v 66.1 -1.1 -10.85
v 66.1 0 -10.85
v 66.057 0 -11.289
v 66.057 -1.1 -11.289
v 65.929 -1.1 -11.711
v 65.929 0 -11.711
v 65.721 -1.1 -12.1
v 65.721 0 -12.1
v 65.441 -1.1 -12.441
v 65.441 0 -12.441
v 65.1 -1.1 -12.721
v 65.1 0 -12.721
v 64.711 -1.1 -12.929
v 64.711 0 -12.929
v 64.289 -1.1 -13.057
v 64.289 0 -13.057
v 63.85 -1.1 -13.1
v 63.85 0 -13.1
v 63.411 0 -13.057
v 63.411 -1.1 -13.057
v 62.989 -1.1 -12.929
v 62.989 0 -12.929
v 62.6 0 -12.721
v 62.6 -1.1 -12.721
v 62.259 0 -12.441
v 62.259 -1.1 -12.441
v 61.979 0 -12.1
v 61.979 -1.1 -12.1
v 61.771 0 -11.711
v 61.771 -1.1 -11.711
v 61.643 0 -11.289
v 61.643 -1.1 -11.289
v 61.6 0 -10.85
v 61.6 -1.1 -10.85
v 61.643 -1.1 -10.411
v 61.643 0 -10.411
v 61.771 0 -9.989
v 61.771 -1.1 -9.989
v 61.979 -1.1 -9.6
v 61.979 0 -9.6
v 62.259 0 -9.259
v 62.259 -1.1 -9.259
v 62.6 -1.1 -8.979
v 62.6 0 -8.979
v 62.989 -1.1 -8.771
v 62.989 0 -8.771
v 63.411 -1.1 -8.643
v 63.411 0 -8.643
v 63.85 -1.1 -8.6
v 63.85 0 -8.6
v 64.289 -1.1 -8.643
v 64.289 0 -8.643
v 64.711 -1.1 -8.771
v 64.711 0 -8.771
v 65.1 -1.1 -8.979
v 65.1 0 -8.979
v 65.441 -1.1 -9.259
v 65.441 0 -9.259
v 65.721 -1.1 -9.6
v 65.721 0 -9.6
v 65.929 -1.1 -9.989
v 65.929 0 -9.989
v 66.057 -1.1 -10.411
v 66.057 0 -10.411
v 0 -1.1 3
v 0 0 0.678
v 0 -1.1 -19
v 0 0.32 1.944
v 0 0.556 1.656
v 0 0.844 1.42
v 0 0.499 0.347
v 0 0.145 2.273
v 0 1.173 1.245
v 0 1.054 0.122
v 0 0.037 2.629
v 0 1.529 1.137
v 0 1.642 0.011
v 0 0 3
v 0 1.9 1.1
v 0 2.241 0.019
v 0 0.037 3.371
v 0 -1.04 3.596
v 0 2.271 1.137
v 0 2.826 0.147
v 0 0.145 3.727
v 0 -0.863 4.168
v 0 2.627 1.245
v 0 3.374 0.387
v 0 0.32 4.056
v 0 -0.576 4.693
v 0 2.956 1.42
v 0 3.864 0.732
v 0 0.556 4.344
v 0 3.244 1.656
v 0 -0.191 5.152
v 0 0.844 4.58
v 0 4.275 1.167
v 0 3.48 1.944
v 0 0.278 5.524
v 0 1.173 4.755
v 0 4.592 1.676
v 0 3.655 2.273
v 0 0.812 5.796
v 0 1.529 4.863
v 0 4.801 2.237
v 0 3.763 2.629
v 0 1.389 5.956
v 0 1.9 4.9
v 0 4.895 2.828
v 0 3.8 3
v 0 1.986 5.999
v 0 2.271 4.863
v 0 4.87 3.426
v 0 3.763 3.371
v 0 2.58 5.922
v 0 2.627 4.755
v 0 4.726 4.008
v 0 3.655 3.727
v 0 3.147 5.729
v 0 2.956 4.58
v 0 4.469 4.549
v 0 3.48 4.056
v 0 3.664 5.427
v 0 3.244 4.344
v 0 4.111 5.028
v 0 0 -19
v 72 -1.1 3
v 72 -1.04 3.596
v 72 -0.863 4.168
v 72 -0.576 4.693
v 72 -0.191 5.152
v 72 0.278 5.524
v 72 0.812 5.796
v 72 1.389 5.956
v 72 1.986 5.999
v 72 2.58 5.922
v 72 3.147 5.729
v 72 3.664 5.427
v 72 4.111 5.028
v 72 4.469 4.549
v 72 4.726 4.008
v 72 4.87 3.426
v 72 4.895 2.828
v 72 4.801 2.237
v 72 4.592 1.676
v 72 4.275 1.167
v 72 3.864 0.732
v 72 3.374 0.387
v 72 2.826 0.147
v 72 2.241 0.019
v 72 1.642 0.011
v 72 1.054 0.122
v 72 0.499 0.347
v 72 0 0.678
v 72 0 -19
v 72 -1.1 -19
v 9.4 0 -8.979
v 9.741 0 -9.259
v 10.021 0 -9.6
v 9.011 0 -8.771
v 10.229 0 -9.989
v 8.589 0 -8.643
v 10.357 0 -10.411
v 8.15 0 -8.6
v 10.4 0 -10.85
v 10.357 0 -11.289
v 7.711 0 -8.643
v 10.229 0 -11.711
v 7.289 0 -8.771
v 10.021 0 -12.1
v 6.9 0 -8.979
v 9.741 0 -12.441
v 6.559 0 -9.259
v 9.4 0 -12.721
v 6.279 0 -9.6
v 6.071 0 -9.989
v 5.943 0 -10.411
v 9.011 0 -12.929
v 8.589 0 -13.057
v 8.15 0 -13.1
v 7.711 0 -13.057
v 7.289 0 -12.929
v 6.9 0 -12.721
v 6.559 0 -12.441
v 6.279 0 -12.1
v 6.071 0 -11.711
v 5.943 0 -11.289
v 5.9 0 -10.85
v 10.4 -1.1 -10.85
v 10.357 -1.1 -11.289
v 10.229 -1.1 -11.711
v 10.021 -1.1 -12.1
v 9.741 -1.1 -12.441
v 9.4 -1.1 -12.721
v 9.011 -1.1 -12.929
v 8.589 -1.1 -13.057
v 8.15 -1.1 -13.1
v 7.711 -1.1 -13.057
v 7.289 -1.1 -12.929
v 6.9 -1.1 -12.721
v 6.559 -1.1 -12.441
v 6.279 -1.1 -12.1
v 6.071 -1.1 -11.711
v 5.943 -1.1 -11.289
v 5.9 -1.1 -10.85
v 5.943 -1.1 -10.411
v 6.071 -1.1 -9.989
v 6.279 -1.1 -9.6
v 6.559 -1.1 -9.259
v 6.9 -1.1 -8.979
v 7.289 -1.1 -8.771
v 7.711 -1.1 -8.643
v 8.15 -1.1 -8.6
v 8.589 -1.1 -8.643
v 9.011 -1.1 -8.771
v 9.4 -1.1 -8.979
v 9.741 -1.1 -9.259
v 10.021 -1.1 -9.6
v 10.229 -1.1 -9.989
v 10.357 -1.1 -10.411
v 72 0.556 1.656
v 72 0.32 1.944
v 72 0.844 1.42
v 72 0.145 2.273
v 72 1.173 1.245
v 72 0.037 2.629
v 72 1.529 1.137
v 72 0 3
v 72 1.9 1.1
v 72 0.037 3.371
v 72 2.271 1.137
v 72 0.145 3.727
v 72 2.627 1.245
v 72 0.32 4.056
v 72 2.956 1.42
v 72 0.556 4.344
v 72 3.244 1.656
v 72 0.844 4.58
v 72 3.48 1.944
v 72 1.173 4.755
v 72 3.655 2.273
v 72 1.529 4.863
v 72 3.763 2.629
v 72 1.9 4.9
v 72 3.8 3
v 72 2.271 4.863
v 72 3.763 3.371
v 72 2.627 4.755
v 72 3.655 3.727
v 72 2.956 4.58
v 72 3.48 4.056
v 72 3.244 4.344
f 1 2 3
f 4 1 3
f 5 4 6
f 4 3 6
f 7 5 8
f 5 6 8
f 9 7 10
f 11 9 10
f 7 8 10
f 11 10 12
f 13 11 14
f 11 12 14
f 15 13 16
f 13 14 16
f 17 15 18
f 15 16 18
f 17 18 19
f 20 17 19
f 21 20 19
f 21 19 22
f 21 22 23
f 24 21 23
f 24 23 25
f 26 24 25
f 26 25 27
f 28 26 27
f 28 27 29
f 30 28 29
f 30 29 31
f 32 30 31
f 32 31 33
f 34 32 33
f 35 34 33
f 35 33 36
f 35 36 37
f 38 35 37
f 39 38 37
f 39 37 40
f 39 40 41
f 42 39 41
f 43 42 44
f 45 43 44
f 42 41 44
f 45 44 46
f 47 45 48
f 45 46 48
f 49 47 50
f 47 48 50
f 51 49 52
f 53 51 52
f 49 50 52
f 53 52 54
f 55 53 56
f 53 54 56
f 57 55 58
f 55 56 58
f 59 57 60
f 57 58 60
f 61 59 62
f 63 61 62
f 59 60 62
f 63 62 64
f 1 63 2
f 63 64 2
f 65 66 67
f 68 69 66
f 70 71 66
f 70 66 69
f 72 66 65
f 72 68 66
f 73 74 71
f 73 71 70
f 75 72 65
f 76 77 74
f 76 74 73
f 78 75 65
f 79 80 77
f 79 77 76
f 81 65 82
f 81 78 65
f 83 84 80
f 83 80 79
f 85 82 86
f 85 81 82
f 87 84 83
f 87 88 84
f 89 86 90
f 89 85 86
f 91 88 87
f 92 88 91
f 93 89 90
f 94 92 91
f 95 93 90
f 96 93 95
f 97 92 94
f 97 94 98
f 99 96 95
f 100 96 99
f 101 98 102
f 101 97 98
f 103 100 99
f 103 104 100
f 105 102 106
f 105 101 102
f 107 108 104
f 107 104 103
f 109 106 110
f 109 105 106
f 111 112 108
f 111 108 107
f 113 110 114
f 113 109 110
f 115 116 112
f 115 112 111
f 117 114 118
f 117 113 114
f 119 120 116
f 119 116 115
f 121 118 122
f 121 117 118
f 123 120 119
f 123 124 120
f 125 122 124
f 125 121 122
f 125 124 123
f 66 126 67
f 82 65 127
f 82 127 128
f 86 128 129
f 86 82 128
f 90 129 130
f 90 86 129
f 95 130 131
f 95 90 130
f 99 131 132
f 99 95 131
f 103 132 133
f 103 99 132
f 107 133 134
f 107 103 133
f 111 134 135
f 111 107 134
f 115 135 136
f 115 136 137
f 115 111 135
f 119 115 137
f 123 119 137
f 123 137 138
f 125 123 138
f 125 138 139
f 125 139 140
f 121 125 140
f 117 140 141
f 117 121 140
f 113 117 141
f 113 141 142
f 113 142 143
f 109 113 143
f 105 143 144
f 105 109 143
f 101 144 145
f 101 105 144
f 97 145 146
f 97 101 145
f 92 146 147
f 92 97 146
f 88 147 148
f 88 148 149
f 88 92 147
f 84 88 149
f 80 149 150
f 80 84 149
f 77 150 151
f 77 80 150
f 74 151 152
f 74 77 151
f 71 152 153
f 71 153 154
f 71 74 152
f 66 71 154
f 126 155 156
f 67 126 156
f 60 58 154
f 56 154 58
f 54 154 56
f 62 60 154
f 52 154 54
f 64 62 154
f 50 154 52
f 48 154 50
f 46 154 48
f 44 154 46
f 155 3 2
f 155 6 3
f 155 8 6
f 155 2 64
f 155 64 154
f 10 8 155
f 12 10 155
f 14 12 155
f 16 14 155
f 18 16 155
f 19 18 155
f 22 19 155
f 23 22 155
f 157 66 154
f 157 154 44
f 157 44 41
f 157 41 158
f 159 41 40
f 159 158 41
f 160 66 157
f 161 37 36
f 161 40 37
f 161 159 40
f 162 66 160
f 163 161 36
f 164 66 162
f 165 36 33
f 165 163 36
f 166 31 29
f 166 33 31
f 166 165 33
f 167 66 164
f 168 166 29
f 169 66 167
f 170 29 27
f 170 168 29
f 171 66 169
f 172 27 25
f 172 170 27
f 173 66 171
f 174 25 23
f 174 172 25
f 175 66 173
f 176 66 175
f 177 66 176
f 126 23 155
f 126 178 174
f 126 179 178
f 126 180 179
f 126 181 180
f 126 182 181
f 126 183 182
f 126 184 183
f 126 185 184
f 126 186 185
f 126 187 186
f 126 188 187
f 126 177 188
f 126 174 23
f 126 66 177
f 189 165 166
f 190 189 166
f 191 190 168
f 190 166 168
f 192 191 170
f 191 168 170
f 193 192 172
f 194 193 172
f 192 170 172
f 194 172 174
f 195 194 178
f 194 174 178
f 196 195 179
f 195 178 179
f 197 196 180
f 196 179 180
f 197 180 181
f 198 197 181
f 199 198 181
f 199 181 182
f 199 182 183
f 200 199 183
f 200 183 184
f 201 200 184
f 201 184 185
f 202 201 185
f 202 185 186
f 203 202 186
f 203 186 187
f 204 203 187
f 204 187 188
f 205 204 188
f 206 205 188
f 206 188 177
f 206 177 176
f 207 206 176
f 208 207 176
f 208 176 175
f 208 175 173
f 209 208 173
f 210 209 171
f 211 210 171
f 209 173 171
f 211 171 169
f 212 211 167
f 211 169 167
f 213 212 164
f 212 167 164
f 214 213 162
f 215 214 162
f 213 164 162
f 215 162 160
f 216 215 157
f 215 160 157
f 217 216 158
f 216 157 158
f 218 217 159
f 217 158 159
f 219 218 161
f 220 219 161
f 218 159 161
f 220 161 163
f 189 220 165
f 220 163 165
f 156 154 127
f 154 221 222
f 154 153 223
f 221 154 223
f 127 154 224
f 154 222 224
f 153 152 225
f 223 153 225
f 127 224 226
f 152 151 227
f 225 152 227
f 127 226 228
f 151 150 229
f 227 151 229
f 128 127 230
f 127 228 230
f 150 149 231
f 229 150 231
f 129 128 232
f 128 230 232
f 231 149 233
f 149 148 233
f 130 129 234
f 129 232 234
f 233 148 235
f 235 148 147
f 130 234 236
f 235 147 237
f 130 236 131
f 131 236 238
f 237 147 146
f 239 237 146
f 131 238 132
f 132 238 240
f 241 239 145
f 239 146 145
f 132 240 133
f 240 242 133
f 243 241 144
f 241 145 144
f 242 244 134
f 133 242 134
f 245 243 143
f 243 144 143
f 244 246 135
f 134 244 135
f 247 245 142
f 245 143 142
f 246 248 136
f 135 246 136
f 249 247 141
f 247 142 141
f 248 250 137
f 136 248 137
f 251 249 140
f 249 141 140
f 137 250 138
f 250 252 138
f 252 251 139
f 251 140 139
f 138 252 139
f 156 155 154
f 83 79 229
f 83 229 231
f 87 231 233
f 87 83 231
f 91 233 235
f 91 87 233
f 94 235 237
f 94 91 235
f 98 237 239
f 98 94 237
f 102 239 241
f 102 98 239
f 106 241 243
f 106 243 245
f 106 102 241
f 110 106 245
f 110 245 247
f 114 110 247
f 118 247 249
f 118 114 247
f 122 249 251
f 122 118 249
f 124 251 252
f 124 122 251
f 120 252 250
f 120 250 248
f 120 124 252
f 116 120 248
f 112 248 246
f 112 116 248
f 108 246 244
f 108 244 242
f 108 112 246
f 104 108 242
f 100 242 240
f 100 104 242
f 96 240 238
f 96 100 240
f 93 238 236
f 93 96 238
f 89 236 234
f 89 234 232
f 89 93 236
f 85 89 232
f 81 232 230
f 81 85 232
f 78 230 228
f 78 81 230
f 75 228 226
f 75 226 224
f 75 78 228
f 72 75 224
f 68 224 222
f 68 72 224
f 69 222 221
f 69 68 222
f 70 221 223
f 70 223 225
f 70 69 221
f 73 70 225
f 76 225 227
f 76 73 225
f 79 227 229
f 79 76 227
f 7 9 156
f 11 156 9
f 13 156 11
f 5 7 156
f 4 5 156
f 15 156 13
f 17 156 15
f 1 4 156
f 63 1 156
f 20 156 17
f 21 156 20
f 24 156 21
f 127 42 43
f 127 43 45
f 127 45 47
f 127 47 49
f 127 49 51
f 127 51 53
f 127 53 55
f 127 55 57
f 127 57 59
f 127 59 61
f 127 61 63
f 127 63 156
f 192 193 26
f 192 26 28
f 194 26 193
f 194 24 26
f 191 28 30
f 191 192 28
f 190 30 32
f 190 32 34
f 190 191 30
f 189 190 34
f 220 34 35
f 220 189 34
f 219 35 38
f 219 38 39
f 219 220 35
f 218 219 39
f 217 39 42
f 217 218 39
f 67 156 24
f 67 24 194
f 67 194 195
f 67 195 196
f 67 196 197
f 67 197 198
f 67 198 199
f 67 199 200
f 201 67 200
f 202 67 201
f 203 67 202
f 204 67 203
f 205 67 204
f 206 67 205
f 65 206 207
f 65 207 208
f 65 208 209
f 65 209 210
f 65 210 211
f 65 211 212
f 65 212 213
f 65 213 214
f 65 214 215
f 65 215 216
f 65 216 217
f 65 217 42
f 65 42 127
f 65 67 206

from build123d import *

# Parameters (mm, degrees)
SKETCH_1_R          = 1.9
EXTRUDE_1_DEPTH     = 72
SKETCH_2_R          = 2.25
CUT_EXTRUDE_1_DEPTH = 2.1


with BuildPart() as part:
    # 草图1 → 凸台-拉伸1 (new body)
    with BuildSketch(Plane(origin=(0, 0, 0), x_dir=(0, 0, -1), z_dir=(1, 0, 0))):
        with BuildLine():
            Line((0, 0), (19, 0))
            Line((19, 0), (19, -1.1))
            Line((19, -1.1), (0, -1.1))
            Line((0, -1.1), (-3, -1.1))
            ThreePointArc((-3, -1.1), (-4.284523258, 4.611088342), (-0.678362647, 0))
            Line((-0.678362647, 0), (0, 0))
        make_face()
        with Locations((-3, 1.9)):
            Circle(SKETCH_1_R, mode=Mode.SUBTRACT)
    extrude(amount=EXTRUDE_1_DEPTH)

    # 草图2 → 切除-拉伸1 (cut, through all)
    with BuildSketch(Plane(origin=(0, 0, 0), x_dir=(1, 0, 0), z_dir=(0, 1, 0))):
        with Locations((8.15, 10.85)):
            Circle(SKETCH_2_R)
        with Locations((63.85, 10.85)):
            Circle(SKETCH_2_R)
    extrude(amount=-CUT_EXTRUDE_1_DEPTH, mode=Mode.SUBTRACT)


solid = part.part
